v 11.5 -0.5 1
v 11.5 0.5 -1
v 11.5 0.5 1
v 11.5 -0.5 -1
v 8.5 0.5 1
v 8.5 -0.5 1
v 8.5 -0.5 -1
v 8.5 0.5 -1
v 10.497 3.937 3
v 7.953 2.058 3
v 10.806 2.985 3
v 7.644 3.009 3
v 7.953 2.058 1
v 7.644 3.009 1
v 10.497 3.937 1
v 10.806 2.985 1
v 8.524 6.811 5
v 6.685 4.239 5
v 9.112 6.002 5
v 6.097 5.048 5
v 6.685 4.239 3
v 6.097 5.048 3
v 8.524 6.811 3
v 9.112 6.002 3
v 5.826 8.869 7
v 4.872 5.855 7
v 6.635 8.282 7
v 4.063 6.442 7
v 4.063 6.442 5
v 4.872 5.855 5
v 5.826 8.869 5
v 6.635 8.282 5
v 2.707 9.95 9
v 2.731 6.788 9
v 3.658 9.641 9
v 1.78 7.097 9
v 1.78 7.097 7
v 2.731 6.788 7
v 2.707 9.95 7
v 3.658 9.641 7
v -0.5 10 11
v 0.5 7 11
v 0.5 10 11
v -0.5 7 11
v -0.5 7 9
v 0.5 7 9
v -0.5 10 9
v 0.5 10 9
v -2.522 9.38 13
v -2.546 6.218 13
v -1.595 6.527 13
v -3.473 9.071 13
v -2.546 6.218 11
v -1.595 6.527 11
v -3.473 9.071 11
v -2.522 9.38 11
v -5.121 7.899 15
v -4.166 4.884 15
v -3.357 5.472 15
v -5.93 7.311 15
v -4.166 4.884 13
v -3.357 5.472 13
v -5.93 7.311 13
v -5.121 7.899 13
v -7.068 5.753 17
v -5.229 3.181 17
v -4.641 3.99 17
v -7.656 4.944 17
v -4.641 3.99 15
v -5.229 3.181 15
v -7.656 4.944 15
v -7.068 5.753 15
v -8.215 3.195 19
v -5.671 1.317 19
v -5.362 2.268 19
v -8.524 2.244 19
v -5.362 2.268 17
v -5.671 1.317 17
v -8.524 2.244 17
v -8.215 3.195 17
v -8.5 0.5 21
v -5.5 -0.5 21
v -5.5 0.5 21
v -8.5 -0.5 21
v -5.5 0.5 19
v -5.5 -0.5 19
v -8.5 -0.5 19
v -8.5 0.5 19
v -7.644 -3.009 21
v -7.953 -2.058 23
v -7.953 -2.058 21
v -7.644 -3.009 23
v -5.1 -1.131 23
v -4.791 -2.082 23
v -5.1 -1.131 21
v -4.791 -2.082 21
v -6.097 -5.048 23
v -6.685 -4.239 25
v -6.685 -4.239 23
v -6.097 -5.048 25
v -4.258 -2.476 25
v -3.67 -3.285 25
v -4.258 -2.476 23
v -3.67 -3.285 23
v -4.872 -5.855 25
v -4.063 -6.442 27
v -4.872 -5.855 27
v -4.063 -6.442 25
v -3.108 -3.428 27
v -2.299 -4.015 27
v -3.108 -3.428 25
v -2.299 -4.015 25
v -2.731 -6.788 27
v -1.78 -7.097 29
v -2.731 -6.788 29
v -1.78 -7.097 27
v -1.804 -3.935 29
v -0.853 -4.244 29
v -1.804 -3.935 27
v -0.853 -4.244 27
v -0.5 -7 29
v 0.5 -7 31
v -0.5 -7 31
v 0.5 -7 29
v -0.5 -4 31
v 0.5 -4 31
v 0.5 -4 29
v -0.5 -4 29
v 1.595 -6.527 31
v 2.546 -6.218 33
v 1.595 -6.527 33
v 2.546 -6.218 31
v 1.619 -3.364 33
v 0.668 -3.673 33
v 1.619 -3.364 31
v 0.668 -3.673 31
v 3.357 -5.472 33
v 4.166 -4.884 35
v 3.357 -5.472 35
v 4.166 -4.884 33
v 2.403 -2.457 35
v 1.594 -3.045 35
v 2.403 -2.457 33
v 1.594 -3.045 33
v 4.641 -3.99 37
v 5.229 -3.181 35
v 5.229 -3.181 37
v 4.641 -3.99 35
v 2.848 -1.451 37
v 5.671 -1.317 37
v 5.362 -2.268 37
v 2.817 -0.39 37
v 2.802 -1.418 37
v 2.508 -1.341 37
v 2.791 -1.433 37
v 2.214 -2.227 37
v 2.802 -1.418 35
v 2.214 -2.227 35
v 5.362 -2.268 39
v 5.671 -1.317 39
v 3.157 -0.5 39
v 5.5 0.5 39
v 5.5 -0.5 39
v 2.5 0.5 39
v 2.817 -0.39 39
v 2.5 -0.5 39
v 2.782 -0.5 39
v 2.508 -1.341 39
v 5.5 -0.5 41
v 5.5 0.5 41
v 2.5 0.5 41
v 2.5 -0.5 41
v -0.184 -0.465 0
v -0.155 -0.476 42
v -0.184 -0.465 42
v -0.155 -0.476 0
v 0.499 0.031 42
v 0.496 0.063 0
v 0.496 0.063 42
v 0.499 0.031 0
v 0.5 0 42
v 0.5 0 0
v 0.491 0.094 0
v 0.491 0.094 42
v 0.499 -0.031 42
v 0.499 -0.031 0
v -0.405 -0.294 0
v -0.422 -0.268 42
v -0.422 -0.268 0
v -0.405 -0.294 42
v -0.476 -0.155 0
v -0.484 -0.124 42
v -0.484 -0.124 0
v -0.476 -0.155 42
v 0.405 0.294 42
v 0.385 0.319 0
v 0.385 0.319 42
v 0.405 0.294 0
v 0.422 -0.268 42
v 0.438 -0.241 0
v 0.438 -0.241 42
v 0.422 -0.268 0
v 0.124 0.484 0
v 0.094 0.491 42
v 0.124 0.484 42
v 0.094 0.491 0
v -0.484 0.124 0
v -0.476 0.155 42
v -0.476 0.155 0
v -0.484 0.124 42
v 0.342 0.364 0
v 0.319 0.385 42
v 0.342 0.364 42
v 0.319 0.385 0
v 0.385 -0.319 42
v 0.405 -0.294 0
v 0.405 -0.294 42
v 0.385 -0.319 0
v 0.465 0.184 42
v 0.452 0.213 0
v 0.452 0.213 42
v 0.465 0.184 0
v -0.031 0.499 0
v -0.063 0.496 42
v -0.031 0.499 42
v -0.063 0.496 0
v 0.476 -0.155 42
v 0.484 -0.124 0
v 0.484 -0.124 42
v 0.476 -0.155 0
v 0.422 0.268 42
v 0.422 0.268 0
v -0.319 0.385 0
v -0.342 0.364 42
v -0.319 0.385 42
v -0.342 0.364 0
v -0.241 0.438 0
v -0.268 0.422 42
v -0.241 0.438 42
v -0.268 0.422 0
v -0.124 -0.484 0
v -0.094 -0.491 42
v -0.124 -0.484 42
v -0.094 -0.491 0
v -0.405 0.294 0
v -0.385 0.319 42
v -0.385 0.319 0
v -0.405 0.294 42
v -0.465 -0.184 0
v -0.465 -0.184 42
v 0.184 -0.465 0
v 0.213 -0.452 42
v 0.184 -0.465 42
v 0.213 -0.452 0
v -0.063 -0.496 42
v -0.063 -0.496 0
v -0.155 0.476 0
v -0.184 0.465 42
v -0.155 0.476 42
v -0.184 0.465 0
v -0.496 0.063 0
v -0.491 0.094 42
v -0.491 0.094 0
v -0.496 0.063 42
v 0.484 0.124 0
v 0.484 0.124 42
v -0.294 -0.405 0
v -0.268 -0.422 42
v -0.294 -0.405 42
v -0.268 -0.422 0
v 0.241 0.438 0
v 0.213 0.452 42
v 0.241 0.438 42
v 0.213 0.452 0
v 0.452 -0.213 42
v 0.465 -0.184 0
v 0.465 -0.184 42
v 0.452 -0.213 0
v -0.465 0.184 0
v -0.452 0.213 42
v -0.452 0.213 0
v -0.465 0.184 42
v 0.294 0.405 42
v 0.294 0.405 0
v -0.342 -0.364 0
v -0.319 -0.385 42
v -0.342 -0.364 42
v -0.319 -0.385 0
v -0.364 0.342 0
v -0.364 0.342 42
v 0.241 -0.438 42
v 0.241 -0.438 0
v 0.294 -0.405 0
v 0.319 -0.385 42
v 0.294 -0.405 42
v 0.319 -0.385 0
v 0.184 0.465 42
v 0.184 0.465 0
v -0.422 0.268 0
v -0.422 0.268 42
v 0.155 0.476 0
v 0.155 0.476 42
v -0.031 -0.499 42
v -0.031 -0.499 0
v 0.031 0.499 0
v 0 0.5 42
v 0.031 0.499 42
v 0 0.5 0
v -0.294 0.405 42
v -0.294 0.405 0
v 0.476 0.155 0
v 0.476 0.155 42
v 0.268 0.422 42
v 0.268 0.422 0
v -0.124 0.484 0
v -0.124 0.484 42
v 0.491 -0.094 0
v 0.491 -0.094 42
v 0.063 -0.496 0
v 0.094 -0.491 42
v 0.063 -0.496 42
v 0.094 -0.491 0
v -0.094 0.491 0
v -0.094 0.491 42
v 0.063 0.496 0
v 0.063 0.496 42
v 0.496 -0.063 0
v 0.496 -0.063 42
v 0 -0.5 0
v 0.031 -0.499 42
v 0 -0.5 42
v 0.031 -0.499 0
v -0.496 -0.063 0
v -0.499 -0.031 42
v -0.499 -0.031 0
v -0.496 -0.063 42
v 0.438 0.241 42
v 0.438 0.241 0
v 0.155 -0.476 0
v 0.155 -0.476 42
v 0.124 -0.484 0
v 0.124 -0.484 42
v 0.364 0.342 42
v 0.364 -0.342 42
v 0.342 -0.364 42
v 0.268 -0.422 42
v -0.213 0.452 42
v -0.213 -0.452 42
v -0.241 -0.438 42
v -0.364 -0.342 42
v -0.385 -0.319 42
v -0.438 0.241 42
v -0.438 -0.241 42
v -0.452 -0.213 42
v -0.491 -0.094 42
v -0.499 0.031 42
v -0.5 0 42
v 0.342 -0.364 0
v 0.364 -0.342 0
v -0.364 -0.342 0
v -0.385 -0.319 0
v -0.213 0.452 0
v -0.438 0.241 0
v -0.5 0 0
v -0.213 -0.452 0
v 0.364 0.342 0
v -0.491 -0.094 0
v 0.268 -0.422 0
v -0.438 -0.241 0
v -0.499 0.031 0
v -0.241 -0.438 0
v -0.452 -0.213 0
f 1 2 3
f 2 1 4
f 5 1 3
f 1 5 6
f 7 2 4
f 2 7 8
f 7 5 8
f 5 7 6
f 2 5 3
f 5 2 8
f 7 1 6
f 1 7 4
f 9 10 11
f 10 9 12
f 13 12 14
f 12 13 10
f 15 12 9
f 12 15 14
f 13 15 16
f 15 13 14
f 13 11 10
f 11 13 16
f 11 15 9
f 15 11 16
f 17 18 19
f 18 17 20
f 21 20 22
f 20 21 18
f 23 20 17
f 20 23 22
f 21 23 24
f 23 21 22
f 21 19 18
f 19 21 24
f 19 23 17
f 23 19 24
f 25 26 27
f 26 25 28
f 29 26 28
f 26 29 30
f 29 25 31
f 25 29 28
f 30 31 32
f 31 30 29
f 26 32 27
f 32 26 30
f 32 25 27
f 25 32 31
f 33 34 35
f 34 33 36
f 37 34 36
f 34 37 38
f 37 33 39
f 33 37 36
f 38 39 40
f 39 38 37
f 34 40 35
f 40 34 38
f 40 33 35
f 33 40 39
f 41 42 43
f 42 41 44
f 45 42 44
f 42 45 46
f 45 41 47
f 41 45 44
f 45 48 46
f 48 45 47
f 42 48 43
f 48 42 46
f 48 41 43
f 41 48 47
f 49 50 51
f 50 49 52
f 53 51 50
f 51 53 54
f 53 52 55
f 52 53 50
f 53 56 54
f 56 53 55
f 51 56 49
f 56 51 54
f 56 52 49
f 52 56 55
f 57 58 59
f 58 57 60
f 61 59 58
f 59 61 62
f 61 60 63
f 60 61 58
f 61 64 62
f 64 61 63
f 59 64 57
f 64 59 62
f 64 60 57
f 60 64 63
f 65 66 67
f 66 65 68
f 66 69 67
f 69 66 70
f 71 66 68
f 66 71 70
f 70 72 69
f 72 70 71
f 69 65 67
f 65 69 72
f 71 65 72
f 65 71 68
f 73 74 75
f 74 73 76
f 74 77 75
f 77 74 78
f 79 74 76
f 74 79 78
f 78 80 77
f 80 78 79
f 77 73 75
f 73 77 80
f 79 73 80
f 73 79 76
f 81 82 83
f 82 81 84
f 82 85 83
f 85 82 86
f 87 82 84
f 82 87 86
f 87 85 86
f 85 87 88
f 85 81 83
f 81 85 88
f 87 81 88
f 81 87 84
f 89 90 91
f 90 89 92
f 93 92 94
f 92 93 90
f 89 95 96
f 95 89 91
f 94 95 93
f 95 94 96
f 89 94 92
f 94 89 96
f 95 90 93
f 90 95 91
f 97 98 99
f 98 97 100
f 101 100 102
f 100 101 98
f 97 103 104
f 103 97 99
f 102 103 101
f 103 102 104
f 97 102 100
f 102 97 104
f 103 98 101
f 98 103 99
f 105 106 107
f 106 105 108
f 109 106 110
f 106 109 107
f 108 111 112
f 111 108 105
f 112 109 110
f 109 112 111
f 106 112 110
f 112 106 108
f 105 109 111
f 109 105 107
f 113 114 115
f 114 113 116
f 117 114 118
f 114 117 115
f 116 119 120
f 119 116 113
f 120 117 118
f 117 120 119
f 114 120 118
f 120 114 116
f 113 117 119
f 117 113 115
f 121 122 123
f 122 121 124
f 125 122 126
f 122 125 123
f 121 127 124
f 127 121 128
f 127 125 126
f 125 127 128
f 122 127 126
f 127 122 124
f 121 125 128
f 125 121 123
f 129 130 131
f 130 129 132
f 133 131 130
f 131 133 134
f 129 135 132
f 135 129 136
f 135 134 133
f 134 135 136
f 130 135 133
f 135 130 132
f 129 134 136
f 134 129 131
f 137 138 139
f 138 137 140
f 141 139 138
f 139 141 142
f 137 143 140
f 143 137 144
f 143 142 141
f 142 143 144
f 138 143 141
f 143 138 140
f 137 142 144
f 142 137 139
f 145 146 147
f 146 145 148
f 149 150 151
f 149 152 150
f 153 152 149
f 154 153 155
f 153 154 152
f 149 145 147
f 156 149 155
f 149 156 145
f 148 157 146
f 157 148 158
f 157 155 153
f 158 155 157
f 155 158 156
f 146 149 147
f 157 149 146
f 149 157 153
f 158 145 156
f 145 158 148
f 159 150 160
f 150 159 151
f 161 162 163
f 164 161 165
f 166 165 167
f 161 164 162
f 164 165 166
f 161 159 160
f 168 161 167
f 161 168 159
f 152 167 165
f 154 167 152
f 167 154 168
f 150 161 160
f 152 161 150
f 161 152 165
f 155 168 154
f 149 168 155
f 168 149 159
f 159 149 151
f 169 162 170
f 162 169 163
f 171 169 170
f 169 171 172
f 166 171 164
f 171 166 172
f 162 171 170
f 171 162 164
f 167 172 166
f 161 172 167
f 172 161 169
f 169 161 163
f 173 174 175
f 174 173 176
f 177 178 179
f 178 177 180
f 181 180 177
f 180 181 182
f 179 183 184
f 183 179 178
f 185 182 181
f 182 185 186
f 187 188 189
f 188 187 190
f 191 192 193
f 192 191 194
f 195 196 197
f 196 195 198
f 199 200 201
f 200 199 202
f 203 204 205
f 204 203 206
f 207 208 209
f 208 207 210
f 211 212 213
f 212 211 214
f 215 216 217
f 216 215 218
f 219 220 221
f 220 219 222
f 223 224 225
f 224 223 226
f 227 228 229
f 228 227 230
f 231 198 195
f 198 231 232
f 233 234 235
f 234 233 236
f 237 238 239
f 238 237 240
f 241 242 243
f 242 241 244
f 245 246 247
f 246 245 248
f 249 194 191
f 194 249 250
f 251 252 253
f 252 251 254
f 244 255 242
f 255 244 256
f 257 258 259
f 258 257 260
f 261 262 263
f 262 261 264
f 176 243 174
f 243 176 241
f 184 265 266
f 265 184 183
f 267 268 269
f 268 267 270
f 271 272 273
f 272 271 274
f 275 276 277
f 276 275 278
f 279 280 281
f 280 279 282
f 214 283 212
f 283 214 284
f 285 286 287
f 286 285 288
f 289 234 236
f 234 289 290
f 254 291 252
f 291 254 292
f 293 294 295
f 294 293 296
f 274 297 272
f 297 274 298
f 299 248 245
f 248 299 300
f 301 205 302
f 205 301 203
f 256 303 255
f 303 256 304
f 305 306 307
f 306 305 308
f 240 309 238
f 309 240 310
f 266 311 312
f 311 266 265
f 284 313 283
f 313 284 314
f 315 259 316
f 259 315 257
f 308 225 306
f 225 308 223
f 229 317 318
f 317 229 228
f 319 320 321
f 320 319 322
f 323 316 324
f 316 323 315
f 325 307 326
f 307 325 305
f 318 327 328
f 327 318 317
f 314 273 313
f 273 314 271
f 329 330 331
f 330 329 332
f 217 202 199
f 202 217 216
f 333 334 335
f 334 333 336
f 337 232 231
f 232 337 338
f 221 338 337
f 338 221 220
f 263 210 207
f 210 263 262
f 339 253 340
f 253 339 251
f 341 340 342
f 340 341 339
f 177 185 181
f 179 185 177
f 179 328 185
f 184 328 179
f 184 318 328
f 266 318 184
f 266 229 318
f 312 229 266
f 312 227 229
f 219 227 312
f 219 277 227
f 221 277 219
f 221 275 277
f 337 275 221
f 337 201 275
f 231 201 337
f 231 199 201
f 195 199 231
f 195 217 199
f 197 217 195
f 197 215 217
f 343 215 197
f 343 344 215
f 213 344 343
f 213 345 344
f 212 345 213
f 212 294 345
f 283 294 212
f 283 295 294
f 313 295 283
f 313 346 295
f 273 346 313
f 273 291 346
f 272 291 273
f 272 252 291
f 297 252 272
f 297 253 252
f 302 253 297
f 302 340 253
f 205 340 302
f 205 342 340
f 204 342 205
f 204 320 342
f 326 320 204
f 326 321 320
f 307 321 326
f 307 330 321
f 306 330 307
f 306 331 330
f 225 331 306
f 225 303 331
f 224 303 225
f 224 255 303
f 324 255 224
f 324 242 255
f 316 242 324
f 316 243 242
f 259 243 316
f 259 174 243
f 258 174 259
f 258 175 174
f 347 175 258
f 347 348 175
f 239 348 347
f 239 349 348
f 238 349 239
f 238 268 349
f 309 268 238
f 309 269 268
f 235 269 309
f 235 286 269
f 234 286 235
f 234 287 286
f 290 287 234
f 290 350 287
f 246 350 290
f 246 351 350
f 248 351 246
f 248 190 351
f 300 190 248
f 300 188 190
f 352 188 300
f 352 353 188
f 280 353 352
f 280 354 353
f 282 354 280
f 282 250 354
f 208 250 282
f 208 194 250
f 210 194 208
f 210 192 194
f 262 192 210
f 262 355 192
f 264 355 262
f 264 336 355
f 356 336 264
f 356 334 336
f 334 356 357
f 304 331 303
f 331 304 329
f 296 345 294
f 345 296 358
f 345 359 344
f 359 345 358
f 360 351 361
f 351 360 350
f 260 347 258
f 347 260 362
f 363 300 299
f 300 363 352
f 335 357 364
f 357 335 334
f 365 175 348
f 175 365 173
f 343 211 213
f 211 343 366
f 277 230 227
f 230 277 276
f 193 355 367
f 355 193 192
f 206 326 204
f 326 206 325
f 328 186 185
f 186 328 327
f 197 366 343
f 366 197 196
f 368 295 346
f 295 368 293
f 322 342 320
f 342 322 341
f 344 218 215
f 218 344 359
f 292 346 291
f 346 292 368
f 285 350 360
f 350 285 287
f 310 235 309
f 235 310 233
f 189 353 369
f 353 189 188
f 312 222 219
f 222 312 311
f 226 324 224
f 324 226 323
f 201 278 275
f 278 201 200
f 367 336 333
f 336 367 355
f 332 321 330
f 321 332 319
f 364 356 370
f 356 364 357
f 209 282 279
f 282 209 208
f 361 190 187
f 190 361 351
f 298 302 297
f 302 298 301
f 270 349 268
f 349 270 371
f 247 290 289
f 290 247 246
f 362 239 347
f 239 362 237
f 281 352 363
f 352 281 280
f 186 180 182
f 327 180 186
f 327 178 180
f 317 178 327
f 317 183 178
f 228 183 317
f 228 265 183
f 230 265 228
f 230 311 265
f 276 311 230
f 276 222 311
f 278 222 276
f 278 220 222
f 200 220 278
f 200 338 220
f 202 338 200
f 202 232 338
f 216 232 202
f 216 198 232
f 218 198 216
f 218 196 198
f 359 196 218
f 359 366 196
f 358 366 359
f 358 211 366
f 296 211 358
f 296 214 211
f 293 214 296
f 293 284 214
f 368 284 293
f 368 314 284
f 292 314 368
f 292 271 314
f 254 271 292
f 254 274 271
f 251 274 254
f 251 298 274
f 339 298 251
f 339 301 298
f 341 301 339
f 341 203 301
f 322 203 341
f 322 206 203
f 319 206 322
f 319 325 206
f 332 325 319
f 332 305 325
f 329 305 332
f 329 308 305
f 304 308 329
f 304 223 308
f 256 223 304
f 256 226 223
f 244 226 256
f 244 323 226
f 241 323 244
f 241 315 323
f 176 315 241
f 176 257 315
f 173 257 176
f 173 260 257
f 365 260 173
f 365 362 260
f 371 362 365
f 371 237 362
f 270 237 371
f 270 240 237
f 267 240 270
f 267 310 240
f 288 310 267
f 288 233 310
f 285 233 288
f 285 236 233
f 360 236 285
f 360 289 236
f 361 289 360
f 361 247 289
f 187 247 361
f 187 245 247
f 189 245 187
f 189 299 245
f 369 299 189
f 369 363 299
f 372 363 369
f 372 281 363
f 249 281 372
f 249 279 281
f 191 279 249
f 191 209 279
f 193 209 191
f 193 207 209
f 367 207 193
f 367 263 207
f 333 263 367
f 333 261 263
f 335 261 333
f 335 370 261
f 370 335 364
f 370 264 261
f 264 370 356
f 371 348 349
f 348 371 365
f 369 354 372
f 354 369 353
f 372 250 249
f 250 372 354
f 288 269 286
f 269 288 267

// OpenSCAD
// OPTION 1: Spiral Tower
// Uncomment this section to try the spiral tower

$fn = 100;
for (i = [0:20]) {
    rotate([0, 0, i * 18])
    translate([10 - i * 0.3, 0, i * 2])
    cube([3, 1, 2], center = true);
}
// Central spiral rod
cylinder(h = 42, r = 0.5);
